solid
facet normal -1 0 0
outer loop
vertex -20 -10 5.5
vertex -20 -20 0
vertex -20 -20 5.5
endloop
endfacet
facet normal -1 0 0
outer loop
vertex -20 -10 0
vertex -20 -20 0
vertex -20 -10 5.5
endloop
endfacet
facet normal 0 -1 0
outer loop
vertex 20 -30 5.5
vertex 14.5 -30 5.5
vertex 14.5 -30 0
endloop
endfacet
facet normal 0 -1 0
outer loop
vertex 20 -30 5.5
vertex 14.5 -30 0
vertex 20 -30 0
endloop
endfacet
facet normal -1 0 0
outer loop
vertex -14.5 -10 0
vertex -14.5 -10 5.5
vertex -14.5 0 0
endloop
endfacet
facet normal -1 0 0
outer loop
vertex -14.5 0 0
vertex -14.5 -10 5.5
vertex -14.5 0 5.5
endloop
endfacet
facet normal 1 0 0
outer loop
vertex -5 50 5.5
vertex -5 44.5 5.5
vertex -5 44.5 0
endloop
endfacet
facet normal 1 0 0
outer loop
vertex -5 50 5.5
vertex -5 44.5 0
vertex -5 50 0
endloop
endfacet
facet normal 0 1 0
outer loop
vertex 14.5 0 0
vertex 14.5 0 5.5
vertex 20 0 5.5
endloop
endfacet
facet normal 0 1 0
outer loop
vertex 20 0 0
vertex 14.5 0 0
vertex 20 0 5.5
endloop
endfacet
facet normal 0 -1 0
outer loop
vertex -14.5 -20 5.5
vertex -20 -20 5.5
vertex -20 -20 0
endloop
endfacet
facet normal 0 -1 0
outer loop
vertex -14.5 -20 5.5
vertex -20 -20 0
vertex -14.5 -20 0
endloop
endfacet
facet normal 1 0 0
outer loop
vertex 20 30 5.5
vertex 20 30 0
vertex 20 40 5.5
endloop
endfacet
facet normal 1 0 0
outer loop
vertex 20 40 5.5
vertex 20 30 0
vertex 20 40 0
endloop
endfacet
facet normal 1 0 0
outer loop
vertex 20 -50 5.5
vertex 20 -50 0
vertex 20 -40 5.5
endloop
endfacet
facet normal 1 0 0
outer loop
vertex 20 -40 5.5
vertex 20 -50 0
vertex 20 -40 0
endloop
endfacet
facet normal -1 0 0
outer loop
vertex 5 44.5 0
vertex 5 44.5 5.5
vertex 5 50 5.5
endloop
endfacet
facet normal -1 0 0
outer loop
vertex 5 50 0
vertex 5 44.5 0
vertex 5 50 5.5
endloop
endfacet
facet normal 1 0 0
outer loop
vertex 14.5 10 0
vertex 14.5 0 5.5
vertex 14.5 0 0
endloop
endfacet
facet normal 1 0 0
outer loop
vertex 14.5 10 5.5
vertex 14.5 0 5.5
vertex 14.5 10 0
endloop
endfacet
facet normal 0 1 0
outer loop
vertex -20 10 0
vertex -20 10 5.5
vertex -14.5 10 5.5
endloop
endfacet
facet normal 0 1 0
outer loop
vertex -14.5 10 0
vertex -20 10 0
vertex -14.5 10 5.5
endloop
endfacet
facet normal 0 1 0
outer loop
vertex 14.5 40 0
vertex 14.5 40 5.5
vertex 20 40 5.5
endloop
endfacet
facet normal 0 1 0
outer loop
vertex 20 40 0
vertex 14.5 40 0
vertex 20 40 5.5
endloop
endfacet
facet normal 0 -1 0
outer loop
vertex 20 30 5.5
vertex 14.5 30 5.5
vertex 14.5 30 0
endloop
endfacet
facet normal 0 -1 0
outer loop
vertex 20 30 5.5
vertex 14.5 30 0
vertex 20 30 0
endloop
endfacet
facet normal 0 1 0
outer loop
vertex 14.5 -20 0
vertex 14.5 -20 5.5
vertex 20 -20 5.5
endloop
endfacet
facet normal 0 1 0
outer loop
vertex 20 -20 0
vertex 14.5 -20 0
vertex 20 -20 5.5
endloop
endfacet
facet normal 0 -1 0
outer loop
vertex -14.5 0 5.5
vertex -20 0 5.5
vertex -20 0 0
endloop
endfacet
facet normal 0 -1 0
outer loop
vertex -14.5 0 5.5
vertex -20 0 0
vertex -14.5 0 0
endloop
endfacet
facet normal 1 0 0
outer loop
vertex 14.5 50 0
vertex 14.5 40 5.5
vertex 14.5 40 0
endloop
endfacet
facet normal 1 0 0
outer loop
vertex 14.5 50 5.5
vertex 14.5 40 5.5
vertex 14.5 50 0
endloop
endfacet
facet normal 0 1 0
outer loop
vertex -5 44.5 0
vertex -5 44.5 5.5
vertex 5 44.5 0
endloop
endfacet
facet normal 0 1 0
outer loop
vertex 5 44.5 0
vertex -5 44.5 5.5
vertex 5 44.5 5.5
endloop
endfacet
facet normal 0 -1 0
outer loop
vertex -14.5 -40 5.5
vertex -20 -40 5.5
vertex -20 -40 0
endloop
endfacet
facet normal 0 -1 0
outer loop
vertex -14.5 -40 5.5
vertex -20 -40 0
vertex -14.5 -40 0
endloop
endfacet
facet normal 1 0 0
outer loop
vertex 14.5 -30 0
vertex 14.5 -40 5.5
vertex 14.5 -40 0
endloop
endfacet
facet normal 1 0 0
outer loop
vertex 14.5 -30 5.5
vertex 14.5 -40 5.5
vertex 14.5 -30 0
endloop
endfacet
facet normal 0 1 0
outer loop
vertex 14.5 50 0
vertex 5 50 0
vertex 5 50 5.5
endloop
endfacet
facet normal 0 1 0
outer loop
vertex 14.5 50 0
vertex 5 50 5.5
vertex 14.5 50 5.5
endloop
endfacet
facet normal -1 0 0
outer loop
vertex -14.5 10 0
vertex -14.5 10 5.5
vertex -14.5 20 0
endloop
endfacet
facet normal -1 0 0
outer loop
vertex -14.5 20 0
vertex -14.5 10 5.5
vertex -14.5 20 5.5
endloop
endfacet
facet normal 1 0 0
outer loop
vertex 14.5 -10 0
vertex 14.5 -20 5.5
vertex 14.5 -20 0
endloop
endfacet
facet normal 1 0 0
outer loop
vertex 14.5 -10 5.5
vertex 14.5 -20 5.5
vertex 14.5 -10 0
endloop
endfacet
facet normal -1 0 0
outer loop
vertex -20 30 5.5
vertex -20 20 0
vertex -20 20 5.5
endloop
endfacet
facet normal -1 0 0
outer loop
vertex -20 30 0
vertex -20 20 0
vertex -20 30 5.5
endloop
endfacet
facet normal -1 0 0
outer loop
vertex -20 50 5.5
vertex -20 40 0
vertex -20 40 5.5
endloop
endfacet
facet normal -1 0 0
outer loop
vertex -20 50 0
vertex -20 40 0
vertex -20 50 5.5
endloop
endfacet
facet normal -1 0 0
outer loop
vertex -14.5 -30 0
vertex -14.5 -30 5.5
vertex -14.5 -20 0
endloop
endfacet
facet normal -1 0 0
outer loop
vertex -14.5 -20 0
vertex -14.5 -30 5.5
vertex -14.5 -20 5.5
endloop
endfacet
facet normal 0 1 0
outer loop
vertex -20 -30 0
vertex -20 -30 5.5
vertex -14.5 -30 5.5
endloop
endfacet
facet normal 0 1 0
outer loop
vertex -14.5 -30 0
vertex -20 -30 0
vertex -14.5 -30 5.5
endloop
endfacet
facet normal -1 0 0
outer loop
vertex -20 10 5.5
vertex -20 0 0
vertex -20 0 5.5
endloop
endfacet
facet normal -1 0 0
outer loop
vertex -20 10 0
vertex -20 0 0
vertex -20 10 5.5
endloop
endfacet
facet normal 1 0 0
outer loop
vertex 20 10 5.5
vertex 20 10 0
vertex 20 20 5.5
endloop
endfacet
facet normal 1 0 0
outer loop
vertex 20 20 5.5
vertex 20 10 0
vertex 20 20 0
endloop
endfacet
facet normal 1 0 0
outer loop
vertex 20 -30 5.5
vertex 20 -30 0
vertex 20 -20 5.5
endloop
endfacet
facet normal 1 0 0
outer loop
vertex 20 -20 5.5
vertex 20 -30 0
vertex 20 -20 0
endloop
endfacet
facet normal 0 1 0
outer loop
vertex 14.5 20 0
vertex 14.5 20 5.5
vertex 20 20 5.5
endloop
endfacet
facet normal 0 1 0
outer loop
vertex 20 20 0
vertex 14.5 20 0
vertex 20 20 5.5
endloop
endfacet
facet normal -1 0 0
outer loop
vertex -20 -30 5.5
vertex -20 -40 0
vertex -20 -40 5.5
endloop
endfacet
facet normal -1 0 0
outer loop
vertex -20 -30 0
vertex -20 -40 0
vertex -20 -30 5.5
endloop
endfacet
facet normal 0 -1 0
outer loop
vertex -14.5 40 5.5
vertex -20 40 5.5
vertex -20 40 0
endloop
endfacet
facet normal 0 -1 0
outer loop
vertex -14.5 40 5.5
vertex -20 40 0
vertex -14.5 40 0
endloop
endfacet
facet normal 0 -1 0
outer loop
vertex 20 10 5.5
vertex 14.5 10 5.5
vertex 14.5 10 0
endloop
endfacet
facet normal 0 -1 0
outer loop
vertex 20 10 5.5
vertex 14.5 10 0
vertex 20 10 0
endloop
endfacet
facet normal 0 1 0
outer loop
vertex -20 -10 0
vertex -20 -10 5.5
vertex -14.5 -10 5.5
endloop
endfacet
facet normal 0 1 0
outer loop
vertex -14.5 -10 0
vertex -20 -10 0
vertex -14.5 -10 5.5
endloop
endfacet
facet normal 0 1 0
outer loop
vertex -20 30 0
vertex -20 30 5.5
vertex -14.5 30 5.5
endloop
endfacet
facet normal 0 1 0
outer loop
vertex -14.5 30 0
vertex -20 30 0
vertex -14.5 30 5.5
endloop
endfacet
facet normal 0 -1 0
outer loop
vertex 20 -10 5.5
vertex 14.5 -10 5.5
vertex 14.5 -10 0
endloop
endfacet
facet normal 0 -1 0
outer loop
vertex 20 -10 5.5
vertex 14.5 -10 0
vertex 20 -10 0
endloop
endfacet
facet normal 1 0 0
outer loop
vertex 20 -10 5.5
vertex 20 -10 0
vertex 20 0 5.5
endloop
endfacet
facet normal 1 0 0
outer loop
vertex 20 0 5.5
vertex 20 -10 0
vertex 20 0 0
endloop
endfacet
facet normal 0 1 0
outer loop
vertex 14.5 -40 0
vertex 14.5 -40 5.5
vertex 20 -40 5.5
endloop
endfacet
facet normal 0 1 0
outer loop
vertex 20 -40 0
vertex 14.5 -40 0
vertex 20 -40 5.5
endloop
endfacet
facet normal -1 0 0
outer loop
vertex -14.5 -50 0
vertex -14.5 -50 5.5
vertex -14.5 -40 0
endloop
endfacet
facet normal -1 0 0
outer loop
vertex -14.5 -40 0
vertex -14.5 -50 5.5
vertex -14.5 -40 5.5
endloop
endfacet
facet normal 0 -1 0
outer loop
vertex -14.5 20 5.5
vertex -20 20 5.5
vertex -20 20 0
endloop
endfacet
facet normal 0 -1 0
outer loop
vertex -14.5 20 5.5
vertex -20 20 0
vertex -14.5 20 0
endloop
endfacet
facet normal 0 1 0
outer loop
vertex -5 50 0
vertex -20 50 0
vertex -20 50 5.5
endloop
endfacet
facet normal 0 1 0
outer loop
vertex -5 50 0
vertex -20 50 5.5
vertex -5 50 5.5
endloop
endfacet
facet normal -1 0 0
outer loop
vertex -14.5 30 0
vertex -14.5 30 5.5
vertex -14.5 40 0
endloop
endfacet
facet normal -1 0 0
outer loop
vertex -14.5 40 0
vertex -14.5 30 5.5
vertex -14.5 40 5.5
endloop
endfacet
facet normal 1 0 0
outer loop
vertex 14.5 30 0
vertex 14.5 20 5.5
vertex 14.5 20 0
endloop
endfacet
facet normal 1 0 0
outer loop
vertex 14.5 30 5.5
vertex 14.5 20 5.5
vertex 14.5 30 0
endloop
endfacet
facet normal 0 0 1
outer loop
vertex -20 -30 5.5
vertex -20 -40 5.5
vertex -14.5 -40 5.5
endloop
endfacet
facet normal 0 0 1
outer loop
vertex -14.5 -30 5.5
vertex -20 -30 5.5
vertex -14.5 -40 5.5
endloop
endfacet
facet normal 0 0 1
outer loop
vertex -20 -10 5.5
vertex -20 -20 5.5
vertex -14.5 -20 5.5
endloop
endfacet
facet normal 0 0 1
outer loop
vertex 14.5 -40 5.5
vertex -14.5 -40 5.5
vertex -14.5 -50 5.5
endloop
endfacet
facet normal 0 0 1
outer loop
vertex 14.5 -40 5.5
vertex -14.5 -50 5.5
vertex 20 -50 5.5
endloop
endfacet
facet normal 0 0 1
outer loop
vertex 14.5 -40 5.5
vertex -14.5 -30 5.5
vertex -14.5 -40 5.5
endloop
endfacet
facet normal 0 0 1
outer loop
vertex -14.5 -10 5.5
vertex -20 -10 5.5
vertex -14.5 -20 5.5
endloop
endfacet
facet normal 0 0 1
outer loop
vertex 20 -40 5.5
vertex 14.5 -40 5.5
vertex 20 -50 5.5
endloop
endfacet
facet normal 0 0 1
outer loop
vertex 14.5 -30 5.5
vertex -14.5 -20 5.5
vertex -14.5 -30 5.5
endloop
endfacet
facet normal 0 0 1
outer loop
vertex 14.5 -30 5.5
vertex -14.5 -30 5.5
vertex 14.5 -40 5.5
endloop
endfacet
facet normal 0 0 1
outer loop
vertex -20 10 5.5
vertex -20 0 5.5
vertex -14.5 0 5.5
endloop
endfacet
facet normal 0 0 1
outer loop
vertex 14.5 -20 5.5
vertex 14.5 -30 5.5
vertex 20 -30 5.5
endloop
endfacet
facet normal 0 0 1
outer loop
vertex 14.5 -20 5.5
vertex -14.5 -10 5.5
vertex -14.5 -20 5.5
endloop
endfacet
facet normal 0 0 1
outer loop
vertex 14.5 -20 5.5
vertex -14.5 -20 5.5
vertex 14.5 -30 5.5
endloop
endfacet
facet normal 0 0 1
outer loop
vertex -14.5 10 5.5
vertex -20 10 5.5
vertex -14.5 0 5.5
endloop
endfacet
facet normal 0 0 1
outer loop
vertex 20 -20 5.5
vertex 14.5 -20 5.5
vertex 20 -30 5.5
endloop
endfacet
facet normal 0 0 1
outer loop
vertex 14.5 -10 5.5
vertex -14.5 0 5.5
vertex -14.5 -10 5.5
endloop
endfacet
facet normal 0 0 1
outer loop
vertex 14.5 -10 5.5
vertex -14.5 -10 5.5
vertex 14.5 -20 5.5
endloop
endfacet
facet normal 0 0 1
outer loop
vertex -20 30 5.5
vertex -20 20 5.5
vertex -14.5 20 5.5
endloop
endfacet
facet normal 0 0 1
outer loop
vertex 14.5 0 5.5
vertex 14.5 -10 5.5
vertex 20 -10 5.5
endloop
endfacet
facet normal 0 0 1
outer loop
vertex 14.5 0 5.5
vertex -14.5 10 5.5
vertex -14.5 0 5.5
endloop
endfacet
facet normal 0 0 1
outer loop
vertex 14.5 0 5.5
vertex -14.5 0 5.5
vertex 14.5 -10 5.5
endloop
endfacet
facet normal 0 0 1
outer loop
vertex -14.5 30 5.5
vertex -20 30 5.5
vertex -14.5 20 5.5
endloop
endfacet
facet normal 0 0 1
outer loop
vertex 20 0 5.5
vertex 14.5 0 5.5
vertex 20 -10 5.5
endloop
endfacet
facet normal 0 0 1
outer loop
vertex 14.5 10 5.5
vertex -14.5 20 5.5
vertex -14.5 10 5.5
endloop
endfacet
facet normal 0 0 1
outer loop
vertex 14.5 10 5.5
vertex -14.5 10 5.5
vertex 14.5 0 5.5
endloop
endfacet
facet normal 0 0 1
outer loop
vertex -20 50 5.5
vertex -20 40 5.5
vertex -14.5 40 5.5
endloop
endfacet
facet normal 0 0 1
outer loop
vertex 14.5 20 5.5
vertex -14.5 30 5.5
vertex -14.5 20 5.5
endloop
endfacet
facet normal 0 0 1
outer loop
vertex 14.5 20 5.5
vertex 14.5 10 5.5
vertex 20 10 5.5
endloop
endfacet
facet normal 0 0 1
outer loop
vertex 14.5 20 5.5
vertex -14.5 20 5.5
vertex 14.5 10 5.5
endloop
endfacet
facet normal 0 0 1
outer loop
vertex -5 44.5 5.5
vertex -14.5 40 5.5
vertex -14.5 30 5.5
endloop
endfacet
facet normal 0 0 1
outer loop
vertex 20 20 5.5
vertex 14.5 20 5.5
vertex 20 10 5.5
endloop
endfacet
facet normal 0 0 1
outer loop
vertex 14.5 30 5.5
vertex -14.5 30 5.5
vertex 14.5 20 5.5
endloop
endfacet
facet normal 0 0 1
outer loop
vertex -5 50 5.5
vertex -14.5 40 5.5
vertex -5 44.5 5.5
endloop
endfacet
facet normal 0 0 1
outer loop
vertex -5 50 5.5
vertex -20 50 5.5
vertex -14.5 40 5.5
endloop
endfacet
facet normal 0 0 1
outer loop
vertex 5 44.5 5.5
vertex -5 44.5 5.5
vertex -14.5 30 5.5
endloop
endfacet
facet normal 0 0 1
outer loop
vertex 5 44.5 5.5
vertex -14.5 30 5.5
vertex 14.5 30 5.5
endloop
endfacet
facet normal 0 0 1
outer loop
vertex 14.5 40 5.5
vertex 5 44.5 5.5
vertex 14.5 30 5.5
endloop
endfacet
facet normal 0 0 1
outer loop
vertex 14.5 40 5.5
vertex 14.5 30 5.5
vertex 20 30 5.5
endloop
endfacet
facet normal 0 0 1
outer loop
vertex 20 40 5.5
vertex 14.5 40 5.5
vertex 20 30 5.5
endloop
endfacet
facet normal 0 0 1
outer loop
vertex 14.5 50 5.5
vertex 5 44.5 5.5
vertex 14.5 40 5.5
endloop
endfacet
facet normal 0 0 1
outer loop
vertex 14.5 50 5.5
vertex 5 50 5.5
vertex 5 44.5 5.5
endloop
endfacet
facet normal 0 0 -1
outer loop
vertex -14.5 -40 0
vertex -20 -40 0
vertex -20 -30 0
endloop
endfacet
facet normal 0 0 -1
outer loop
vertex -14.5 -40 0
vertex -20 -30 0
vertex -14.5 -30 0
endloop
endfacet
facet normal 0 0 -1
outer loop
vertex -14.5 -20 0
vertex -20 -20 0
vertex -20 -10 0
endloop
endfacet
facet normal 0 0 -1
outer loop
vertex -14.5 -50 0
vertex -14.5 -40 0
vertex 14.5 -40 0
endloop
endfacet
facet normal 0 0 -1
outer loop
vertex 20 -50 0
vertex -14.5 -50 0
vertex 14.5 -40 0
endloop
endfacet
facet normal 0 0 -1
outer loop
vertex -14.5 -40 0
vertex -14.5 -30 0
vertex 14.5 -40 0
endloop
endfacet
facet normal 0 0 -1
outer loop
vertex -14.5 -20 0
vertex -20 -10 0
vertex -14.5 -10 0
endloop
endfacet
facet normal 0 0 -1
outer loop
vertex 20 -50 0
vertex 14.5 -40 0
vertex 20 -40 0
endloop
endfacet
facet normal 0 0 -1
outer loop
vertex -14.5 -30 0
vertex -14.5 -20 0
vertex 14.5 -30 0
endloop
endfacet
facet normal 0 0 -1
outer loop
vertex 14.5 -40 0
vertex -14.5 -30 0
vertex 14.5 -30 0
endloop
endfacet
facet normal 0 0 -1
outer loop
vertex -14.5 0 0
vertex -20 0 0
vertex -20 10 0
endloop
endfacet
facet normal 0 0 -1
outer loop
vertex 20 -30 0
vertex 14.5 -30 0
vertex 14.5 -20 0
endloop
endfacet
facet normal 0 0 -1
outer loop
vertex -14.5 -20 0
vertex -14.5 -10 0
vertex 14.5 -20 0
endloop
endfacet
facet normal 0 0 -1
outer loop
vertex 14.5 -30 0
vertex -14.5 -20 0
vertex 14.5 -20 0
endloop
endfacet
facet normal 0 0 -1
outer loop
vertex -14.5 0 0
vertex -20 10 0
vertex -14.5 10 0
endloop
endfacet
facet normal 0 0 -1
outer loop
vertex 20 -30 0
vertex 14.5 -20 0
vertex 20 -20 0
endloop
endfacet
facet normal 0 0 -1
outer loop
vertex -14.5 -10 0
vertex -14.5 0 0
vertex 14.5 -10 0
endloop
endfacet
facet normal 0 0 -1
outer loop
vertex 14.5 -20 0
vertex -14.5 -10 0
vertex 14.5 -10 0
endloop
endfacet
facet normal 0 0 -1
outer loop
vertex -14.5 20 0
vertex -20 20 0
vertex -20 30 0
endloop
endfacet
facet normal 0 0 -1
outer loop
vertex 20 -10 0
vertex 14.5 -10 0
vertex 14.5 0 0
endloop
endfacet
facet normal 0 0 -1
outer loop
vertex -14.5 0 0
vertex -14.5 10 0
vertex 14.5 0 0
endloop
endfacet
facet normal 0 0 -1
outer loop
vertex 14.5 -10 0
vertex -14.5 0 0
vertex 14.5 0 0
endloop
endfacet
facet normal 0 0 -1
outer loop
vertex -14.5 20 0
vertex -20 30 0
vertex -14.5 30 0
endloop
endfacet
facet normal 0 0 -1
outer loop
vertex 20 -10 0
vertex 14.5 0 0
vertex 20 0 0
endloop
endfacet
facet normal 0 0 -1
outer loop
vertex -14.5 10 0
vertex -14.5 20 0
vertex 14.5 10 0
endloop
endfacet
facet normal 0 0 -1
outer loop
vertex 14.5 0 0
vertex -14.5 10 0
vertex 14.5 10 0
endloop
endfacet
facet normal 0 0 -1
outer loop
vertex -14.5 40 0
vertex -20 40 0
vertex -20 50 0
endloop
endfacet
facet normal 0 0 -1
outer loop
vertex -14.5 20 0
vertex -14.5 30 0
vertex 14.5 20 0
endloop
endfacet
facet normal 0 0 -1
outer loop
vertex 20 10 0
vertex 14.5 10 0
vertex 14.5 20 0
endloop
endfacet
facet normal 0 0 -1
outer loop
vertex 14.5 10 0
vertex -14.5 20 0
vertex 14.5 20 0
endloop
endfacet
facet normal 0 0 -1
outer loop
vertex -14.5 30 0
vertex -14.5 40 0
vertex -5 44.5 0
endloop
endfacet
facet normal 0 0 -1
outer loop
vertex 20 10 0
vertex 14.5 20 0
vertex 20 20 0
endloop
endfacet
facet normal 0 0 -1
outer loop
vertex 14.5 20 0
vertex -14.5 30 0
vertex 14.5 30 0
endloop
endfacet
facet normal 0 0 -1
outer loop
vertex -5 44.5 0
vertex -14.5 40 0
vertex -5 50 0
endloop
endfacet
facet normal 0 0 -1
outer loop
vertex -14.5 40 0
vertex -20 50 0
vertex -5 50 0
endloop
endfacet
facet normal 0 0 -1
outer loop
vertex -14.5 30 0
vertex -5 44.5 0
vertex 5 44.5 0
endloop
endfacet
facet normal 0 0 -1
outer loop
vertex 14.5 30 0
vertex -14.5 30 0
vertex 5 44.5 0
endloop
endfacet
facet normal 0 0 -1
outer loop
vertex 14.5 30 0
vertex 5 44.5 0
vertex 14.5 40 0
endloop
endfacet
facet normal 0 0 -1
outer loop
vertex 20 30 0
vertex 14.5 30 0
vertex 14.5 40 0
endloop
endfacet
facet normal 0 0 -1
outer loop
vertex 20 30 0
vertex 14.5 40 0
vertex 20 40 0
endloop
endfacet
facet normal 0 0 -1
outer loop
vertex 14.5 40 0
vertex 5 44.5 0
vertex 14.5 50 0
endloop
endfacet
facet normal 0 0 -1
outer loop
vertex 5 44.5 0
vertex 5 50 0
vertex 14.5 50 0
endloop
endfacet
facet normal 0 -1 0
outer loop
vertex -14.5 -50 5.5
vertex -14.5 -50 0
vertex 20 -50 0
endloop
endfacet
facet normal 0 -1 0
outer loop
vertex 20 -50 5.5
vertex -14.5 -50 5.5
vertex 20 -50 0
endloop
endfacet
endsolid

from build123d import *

# Parameters (mm, degrees)
SKETCH_1_W          = 40
SKETCH_1_H          = 100
EXTRUDE_1_DEPTH     = 5.5
SKETCH_2_W          = 5.5
SKETCH_2_H          = 10
CUT_EXTRUDE_1_DEPTH = 55.13178364
SKETCH_3_W          = 10
SKETCH_3_H          = 5.5
CUT_EXTRUDE_2_DEPTH = 55.13178364


with BuildPart() as part:
    # ｽｹｯﾁ1 → ﾎﾞｽ - 押し出し1 (new body)
    with BuildSketch(Plane.XY):
        Rectangle(SKETCH_1_W, SKETCH_1_H)
    extrude(amount=EXTRUDE_1_DEPTH)

    # ｽｹｯﾁ2 → ｶｯﾄ - 押し出し1 (cut, through all)
    with BuildSketch(Plane.XY.offset(5.5)):
        with Locations((-17.25, -45)):
            Rectangle(SKETCH_2_W, SKETCH_2_H)
        with Locations((17.25, -35)):
            Rectangle(SKETCH_2_W, SKETCH_2_H)
        with Locations((-17.25, -25)):
            Rectangle(SKETCH_2_W, SKETCH_2_H)
        with Locations((17.25, -15)):
            Rectangle(SKETCH_2_W, SKETCH_2_H)
        with Locations((-17.25, -5)):
            Rectangle(SKETCH_2_W, SKETCH_2_H)
        with Locations((17.25, 5)):
            Rectangle(SKETCH_2_W, SKETCH_2_H)
        with Locations((-17.25, 15)):
            Rectangle(SKETCH_2_W, SKETCH_2_H)
        with Locations((17.25, 25)):
            Rectangle(SKETCH_2_W, SKETCH_2_H)
        with Locations((-17.25, 35)):
            Rectangle(SKETCH_2_W, SKETCH_2_H)
        with Locations((17.25, 45)):
            Rectangle(SKETCH_2_W, SKETCH_2_H)
    extrude(amount=-CUT_EXTRUDE_1_DEPTH, mode=Mode.SUBTRACT)

    # ｽｹｯﾁ3 → ｶｯﾄ - 押し出し2 (cut, through all)
    with BuildSketch(Plane.XY.offset(5.5)):
        with Locations((0, 47.25)):
            Rectangle(SKETCH_3_W, SKETCH_3_H)
    extrude(amount=-CUT_EXTRUDE_2_DEPTH, mode=Mode.SUBTRACT)


solid = part.part
